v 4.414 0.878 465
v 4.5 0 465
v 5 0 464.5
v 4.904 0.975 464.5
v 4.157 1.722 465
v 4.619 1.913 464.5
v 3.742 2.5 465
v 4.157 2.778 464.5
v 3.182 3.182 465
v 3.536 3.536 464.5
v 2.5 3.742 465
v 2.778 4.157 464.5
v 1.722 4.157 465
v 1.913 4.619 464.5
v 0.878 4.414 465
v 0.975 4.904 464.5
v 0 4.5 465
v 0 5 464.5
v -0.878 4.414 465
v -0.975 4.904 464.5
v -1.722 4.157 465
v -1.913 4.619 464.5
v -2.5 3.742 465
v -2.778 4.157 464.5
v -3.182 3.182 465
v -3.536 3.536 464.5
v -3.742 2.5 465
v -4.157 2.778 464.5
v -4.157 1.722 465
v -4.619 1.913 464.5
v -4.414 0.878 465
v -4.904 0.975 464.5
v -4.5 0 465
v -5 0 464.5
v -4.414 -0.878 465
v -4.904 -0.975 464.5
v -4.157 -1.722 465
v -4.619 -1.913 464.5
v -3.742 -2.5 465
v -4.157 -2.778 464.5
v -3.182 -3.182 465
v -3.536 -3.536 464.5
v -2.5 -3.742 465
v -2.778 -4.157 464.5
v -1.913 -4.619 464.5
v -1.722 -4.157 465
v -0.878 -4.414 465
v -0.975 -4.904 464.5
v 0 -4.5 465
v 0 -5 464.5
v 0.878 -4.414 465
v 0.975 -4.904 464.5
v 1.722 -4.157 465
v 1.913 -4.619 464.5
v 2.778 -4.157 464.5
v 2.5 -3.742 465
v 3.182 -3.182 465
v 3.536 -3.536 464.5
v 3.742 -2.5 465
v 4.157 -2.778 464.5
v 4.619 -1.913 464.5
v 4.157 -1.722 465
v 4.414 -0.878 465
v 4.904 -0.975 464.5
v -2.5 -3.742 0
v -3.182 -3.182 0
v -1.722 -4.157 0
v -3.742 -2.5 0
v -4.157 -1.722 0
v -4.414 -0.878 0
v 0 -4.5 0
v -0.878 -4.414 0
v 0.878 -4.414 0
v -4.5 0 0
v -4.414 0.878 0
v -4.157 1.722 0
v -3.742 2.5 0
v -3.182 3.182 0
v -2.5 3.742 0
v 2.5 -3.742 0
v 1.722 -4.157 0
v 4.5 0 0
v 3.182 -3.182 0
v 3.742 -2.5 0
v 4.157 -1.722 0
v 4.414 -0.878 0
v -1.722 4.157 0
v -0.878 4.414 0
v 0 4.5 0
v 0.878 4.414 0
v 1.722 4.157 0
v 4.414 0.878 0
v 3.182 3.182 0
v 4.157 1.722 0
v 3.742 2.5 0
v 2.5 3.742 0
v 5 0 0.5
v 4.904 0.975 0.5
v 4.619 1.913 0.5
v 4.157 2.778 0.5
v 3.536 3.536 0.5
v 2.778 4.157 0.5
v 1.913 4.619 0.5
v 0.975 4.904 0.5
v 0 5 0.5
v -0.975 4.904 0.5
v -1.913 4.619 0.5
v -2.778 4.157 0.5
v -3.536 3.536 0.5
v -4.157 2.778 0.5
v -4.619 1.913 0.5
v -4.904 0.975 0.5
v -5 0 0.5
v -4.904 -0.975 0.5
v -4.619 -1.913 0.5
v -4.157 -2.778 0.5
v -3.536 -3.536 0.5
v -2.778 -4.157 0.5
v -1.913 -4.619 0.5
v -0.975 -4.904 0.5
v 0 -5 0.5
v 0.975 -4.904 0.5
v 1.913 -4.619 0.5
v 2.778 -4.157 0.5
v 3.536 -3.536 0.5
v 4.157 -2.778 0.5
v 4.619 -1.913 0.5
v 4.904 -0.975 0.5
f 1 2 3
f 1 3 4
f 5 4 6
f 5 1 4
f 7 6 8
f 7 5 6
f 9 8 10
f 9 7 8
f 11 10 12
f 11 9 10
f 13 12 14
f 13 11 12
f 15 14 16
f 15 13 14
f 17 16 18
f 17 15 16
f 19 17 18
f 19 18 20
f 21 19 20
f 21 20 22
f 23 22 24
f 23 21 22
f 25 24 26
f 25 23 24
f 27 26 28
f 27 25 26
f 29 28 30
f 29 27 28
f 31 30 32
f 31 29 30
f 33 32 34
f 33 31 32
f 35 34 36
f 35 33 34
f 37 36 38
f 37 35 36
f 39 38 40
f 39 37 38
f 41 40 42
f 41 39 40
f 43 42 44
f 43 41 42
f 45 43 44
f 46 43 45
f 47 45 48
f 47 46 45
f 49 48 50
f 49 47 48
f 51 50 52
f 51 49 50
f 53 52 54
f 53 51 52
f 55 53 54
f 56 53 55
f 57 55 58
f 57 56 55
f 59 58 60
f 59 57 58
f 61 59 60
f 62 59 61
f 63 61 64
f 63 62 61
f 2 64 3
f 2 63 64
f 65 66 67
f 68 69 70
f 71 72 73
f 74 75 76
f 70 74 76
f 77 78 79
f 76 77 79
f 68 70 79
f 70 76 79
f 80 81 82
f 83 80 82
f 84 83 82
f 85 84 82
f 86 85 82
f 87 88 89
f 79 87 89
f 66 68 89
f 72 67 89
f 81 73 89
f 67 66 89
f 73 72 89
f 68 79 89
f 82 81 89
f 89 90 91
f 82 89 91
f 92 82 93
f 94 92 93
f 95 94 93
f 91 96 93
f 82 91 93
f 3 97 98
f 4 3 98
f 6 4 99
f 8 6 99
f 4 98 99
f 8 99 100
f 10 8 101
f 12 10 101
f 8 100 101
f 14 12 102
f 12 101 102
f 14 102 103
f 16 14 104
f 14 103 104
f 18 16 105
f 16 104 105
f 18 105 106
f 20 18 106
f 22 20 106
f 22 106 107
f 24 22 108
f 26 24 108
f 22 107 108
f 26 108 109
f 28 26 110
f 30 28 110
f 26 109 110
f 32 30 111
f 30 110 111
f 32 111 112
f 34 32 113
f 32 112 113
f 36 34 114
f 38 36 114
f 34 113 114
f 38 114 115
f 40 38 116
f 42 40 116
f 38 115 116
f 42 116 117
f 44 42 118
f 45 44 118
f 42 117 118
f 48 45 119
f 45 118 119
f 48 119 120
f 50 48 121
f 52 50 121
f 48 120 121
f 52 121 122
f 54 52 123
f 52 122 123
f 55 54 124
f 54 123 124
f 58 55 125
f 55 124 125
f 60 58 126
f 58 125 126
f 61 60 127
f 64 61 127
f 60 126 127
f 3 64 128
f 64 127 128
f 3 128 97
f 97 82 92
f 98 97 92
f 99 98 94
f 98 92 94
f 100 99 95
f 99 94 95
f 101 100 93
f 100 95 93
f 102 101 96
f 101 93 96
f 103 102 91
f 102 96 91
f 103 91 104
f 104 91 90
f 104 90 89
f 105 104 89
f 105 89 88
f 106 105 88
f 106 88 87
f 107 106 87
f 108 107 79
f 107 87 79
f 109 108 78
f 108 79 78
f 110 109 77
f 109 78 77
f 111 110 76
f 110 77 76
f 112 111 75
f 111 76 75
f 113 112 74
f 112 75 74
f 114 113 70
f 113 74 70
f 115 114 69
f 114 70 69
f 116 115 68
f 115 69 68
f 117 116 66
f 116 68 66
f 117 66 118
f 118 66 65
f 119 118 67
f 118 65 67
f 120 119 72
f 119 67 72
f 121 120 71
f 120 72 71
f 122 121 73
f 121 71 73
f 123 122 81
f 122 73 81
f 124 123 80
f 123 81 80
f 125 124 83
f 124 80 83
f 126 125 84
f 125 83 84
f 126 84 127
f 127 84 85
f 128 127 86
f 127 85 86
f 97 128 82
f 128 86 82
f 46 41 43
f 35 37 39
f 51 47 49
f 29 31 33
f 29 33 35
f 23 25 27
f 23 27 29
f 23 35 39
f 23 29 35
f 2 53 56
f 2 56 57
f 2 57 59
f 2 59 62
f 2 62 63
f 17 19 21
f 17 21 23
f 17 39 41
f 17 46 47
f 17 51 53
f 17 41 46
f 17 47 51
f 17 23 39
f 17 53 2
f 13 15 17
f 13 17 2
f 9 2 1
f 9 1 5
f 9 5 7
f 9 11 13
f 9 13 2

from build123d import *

# Parameters (mm, degrees)
SKETCH1_R           = 5
BOSS_EXTRUDE1_DEPTH = 465
CHAMFER1_SIZE       = 0.5
CHAMFER2_SIZE       = 0.5


with BuildPart() as part:
    # Sketch1 → Boss-Extrude1 (new body)
    with BuildSketch(Plane.XY):
        Circle(SKETCH1_R)
    extrude(amount=BOSS_EXTRUDE1_DEPTH)

    # Chamfer1
    chamfer1_edges = [part.edges().sort_by_distance(p)[0] for p in [
        (-5, 0, 465),
    ]]
    chamfer(chamfer1_edges, length=CHAMFER1_SIZE)

    # Chamfer2
    chamfer2_edges = [part.edges().sort_by_distance(p)[0] for p in [
        (-5, 0, 0),
    ]]
    chamfer(chamfer2_edges, length=CHAMFER2_SIZE)


solid = part.part
